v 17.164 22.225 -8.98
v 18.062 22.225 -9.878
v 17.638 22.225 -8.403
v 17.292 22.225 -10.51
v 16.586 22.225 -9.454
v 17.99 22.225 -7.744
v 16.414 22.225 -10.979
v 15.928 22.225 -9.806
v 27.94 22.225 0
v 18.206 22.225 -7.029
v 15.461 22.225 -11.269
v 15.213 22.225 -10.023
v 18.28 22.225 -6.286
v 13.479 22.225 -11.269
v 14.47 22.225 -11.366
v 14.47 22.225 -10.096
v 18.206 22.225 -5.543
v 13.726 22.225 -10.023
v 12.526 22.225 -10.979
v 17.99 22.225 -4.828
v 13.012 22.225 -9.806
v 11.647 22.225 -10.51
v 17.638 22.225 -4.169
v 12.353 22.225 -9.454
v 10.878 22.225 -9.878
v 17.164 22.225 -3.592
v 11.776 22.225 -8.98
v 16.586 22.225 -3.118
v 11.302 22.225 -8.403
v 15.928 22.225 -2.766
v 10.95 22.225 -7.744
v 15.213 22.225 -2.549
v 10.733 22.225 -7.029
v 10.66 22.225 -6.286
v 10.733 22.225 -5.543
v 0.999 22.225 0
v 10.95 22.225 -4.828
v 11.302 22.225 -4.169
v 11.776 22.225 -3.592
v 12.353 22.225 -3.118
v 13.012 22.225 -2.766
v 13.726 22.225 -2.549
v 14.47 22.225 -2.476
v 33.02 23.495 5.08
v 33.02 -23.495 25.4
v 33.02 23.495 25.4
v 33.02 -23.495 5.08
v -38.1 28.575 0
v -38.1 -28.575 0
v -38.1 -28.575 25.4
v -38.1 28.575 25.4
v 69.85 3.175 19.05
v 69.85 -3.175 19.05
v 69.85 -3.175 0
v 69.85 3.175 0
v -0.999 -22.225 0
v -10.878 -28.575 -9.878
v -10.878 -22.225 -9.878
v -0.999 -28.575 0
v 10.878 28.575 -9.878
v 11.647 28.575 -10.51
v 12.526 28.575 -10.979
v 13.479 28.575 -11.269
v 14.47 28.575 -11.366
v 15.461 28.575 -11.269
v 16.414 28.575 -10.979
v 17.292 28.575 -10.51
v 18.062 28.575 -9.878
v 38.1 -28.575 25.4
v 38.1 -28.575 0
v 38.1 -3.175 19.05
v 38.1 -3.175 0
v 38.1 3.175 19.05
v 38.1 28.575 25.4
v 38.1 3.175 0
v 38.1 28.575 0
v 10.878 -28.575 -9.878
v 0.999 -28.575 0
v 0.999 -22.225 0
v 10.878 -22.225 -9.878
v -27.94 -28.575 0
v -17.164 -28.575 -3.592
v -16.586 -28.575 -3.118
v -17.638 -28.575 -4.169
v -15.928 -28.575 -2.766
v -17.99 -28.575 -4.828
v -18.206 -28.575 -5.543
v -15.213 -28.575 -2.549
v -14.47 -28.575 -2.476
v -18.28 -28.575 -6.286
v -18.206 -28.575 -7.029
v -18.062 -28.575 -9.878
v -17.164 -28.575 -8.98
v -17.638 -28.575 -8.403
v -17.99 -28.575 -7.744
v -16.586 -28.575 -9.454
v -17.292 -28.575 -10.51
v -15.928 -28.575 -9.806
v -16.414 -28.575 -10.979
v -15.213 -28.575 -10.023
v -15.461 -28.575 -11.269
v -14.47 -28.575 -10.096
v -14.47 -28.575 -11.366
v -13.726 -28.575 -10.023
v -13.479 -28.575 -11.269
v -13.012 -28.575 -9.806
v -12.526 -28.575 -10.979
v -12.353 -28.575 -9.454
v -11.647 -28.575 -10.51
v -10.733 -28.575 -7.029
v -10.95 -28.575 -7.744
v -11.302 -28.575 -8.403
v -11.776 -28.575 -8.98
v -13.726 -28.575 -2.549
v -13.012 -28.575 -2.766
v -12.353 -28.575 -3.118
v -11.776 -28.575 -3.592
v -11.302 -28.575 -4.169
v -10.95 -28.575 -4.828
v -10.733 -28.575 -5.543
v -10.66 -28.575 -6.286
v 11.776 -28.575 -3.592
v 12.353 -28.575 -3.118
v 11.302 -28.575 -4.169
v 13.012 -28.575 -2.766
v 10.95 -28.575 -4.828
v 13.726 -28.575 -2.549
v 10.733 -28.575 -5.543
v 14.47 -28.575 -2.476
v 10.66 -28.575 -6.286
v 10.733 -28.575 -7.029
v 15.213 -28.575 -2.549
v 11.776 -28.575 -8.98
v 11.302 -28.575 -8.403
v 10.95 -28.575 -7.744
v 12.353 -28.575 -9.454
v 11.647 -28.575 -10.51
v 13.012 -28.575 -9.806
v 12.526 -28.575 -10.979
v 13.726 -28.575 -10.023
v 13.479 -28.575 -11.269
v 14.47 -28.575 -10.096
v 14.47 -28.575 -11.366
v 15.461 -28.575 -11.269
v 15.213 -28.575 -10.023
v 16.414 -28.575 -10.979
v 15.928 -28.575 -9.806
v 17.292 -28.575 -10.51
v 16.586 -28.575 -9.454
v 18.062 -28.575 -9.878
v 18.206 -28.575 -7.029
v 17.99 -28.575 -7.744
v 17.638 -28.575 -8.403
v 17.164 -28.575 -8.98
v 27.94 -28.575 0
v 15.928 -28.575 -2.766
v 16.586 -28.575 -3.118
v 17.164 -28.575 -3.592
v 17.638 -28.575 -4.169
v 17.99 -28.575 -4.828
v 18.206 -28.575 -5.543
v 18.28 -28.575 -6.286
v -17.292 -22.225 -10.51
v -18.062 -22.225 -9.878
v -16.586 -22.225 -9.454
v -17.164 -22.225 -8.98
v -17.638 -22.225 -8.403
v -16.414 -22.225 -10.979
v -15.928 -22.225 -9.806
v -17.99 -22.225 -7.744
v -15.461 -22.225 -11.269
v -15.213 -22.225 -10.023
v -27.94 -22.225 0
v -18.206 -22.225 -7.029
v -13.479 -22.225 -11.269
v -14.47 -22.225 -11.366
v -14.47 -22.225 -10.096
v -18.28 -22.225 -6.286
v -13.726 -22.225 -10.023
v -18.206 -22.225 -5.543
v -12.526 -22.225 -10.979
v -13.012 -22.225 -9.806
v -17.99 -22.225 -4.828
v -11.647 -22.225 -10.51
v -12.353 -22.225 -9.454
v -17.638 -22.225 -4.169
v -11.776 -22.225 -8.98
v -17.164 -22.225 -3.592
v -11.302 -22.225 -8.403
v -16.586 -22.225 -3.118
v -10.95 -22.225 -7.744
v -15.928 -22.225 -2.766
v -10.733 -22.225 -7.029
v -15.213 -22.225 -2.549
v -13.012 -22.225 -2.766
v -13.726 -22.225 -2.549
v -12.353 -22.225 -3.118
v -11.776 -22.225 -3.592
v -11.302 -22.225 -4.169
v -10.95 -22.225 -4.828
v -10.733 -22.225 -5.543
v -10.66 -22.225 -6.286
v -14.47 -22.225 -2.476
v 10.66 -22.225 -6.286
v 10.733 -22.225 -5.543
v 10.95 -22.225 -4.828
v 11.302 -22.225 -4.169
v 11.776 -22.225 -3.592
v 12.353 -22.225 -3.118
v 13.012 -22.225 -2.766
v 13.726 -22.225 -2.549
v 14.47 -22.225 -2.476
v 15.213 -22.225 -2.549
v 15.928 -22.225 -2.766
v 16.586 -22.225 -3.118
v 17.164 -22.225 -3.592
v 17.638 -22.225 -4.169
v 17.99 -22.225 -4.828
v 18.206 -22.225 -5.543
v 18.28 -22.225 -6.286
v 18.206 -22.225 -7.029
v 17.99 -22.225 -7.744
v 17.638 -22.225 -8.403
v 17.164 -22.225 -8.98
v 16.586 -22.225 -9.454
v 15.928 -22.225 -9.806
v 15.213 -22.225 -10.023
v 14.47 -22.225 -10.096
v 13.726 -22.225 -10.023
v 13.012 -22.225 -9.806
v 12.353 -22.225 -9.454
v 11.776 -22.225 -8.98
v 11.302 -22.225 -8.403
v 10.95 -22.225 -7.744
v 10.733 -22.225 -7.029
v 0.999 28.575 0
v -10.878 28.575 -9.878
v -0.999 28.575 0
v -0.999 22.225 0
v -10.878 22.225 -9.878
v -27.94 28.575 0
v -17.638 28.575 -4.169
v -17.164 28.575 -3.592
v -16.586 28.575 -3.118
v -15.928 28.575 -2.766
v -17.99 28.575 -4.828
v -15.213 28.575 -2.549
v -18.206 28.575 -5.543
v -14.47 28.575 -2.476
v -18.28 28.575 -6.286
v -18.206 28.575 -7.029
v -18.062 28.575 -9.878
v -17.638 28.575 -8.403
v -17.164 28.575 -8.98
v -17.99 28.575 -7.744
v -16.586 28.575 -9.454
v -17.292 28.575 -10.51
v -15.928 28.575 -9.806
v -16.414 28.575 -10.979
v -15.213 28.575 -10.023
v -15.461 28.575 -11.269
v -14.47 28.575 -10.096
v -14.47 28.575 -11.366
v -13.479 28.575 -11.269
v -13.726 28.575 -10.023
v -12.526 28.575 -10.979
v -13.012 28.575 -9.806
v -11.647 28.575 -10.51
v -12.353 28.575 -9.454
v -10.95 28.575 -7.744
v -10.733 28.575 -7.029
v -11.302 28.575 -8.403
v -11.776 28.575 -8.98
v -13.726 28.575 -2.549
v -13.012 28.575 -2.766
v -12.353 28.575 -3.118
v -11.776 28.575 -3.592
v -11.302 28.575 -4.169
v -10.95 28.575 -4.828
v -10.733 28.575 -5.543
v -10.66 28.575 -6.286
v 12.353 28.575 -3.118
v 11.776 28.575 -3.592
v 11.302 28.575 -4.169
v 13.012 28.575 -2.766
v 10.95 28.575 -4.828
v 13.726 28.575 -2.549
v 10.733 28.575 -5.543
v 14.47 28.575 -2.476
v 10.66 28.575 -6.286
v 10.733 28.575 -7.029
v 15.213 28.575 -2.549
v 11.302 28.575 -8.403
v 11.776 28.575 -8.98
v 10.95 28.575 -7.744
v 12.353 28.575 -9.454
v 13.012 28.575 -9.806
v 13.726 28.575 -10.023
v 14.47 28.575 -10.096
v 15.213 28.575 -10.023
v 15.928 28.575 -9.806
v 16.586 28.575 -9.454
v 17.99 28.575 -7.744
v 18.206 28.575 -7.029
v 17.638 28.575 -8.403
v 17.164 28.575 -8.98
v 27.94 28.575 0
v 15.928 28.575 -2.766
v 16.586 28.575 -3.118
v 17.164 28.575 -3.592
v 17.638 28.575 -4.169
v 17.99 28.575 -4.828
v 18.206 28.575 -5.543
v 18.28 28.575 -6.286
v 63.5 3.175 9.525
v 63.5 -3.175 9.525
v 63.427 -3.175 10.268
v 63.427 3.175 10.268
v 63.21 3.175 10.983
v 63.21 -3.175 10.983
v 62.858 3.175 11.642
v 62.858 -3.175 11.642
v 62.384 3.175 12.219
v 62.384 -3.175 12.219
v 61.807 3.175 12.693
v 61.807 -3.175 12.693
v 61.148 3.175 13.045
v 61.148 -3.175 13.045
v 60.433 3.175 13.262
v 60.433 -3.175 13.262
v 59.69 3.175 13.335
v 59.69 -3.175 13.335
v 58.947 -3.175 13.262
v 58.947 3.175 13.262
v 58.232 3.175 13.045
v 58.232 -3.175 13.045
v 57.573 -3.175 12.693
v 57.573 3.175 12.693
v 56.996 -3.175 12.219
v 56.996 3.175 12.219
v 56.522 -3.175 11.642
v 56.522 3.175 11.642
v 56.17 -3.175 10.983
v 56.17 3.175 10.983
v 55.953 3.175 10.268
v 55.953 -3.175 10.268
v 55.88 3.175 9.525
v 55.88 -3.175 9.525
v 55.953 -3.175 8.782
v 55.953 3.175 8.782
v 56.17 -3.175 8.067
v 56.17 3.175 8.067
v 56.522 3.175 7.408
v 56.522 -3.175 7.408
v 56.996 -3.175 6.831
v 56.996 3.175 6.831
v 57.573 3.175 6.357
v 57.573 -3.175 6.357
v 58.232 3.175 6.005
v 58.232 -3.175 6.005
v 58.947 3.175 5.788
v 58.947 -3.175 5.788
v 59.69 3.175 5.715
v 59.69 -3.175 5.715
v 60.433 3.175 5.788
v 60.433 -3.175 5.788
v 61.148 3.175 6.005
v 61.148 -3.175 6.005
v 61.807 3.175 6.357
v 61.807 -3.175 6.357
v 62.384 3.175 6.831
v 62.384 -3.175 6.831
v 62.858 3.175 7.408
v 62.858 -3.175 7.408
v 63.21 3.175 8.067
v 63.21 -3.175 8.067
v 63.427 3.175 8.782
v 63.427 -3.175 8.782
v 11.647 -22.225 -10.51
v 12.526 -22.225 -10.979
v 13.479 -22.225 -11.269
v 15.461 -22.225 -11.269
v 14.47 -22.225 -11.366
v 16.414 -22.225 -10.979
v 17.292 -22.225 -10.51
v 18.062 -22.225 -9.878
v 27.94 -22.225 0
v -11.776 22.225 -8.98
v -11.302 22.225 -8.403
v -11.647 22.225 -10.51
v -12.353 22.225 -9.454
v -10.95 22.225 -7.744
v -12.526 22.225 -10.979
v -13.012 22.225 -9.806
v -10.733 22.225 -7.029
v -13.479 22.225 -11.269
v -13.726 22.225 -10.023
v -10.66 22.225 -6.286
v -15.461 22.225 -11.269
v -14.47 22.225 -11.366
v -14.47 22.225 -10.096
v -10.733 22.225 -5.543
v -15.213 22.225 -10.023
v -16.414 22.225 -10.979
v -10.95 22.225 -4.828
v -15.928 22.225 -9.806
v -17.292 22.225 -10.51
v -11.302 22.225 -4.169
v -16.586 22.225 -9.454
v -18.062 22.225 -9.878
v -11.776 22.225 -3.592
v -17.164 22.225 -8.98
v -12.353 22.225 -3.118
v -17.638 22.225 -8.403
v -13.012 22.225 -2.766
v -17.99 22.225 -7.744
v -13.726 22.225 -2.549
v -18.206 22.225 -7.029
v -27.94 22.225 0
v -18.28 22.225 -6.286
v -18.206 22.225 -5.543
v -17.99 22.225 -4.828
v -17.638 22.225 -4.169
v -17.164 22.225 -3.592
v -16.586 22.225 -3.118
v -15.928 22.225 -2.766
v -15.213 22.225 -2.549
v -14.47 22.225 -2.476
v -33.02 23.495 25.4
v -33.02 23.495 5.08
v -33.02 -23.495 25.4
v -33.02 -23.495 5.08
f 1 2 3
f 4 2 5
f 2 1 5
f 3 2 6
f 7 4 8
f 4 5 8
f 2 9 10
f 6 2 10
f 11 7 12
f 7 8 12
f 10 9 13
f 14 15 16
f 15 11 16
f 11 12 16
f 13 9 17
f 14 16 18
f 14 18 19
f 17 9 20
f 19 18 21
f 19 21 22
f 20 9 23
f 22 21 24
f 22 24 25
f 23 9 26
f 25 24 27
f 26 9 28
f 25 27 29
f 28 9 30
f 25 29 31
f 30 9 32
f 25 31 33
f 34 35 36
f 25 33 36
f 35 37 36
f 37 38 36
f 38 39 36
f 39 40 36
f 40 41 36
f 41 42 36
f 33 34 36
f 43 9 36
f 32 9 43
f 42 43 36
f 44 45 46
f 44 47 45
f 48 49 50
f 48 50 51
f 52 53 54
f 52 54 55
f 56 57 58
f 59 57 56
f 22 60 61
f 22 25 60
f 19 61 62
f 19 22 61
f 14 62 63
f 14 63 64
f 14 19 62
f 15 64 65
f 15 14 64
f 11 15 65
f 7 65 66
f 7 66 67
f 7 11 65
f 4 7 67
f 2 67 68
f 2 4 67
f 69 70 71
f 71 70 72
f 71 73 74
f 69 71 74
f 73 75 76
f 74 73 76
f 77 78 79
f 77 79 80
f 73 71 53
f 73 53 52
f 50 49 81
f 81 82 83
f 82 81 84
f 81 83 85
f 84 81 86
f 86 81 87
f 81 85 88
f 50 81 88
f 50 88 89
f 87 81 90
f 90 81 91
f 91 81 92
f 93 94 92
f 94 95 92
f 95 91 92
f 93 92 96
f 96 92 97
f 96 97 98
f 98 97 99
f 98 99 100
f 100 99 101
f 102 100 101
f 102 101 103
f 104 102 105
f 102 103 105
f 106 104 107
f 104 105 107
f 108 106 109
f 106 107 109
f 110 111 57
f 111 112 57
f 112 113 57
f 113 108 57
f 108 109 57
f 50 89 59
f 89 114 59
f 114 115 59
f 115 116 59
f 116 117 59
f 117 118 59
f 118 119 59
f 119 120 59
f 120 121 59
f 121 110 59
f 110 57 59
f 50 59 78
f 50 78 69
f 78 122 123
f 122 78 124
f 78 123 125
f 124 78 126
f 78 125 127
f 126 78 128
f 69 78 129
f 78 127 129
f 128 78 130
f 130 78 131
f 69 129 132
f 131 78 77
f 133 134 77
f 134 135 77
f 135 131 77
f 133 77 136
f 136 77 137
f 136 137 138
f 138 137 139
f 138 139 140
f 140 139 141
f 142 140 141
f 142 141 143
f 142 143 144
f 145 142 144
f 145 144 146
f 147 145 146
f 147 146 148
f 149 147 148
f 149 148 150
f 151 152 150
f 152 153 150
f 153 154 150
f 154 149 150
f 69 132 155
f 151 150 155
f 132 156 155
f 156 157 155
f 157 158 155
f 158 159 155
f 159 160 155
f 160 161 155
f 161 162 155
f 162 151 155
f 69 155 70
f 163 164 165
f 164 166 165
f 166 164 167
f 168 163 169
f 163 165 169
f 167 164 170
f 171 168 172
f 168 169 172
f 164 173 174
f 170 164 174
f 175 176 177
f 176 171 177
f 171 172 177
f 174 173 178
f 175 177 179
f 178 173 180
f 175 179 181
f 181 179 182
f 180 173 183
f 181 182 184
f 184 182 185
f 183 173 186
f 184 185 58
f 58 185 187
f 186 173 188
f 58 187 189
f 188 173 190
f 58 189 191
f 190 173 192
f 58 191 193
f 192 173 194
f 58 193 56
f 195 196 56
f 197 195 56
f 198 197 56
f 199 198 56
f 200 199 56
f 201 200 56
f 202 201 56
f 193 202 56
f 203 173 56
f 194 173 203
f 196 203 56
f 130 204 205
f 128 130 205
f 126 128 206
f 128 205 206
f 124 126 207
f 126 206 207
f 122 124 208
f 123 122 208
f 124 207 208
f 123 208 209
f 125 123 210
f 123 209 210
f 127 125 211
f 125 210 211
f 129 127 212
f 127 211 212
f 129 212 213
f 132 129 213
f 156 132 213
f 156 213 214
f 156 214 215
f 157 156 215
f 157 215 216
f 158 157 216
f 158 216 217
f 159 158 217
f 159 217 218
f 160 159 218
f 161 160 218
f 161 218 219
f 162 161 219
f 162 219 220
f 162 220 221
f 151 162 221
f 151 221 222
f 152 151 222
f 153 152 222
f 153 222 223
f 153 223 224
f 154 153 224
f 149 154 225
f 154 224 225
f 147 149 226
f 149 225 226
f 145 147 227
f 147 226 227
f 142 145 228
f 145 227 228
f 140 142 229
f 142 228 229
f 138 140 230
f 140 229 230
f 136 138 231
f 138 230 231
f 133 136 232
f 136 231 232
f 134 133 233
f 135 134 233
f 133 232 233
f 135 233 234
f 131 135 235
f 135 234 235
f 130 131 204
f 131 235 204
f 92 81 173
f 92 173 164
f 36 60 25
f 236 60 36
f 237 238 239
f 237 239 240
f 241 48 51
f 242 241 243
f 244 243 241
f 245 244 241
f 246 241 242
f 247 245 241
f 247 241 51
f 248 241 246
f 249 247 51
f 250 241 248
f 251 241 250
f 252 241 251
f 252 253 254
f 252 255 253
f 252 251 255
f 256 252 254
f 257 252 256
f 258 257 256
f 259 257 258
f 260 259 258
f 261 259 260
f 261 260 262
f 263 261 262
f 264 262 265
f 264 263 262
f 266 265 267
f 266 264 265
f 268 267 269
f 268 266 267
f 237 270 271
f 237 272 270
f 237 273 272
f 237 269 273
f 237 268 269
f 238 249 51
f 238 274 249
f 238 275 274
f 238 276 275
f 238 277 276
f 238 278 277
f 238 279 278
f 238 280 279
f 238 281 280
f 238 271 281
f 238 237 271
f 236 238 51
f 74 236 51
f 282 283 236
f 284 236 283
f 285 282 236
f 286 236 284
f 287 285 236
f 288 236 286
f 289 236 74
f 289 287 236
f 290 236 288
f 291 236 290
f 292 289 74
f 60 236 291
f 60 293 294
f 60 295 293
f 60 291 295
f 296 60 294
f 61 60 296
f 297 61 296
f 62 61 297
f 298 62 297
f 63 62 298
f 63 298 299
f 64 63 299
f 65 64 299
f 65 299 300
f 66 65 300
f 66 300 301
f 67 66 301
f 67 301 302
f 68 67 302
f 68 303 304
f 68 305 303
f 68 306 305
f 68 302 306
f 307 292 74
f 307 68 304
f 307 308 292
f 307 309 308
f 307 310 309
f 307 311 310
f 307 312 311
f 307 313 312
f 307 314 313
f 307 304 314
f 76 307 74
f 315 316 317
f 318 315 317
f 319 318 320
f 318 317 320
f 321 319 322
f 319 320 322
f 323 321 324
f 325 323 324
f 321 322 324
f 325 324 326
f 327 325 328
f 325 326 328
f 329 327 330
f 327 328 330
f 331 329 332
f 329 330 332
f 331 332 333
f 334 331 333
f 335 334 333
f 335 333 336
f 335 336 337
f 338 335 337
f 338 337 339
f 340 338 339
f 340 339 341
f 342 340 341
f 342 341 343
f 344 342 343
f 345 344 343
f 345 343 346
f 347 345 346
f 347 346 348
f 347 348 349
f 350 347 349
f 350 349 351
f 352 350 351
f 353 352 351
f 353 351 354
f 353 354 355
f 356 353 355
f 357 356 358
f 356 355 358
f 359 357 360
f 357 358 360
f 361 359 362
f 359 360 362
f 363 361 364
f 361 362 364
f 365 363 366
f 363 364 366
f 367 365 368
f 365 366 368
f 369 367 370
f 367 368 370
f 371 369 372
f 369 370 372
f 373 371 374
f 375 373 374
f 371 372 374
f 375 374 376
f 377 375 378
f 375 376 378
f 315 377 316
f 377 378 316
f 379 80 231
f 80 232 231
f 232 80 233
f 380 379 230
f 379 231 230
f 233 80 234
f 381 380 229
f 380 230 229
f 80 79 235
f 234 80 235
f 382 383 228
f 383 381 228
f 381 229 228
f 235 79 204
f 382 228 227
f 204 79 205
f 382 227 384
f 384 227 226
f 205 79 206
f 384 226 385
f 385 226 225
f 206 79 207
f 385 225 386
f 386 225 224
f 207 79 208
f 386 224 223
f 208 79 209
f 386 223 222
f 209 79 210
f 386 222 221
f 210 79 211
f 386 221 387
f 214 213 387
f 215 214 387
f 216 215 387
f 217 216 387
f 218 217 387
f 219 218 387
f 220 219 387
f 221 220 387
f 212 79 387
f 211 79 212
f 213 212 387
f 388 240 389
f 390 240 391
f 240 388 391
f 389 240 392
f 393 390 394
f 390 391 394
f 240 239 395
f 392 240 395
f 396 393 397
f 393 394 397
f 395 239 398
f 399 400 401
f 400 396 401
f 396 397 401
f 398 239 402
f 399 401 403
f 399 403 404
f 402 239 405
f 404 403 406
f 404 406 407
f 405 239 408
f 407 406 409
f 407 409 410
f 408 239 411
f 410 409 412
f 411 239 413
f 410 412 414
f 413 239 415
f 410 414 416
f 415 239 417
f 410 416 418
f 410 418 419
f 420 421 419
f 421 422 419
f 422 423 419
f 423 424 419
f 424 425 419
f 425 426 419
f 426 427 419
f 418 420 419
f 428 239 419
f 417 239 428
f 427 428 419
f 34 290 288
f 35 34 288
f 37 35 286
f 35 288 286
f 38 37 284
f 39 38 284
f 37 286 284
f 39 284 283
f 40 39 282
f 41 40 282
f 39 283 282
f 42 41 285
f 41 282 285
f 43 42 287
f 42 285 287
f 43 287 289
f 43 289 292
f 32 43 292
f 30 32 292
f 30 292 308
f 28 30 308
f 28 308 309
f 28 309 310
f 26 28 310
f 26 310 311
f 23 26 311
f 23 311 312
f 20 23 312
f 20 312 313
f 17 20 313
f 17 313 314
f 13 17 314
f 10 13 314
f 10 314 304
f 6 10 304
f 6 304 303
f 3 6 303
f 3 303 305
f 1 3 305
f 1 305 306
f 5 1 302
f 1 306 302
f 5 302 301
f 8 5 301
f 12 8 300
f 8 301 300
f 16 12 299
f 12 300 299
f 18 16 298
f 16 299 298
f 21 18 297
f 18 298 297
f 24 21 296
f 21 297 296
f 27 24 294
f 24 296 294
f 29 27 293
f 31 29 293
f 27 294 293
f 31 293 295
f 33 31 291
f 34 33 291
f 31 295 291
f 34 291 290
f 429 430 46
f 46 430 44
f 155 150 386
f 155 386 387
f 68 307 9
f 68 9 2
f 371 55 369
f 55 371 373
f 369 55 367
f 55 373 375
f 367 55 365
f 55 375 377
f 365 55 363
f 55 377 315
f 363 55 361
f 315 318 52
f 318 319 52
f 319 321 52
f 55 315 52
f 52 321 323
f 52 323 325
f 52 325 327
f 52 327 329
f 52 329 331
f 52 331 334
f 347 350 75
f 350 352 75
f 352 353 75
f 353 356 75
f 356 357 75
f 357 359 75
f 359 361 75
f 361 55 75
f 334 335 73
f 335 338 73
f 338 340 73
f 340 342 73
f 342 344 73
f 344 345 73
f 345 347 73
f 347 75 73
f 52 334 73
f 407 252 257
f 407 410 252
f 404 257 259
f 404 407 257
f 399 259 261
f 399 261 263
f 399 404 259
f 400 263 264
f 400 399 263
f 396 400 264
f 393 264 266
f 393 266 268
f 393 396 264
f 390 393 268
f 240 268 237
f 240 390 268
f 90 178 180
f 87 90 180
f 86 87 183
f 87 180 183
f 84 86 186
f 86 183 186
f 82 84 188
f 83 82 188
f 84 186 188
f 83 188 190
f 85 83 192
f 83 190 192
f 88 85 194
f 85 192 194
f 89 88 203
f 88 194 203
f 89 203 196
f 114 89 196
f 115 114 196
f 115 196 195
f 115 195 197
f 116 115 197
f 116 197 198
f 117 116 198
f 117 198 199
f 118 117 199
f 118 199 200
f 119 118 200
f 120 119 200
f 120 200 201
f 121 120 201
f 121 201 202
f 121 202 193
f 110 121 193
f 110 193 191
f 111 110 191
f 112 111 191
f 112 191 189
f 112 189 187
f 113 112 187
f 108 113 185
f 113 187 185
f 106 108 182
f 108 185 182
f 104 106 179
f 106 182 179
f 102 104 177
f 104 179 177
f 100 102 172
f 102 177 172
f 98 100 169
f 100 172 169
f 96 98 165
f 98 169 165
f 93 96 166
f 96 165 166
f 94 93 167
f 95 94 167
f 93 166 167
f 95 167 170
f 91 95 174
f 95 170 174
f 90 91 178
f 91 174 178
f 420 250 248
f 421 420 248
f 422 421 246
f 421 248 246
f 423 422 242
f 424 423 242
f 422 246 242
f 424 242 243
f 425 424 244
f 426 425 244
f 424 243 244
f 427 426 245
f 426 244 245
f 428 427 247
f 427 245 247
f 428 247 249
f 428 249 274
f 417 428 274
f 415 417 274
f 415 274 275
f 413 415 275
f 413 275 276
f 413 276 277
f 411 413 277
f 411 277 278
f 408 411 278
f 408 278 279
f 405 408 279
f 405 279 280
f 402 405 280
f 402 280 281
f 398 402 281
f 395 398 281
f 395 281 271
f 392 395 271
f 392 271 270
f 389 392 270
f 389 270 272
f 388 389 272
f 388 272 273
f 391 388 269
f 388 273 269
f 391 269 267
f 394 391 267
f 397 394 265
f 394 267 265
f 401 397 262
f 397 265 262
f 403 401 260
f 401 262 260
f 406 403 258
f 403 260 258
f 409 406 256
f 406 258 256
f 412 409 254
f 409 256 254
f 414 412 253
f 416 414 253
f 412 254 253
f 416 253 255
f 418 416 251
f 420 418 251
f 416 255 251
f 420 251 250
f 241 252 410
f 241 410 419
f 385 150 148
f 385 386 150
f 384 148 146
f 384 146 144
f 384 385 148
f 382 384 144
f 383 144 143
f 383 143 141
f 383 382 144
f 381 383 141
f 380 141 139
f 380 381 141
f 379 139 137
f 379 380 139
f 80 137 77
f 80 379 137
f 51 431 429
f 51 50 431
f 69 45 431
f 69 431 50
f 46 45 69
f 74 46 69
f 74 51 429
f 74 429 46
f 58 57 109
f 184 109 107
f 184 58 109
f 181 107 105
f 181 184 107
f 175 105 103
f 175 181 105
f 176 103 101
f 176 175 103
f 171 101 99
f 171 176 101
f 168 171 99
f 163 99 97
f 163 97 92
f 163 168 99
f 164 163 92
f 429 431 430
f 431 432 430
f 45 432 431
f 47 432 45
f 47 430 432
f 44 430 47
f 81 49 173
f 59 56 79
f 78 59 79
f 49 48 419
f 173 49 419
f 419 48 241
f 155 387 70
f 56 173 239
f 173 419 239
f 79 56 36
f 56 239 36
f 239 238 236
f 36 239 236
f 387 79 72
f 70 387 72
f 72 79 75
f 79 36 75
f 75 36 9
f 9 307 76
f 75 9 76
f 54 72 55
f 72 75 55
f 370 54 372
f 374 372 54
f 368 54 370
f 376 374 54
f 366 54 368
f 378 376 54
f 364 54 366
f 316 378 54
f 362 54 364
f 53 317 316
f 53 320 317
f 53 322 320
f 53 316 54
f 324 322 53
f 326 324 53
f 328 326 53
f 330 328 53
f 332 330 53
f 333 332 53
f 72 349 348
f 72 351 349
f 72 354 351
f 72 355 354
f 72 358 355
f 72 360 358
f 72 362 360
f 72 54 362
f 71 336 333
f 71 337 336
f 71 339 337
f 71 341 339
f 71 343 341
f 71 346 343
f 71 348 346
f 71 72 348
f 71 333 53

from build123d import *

# Parameters (mm, degrees)
F0_W      = 76.2
F0_H      = 57.15
F1_DEPTH  = 25.4
F2_T      = -5.08
F4_DEPTH  = 6.35
F5_R      = 5.08
F8_DEPTH  = 6.35
F9_D      = 7.62
F10_R     = 5.08
F11_W     = 6.35
F11_H     = 19.05
F12_DEPTH = 31.75
F14_D     = 7.62


with BuildPart() as f1:
    # F0 (on Top) → F1 (new body)
    with BuildSketch(Plane.XY):
        Rectangle(F0_W, F0_H)
    extrude(amount=F1_DEPTH)

    # F2
    f2_openings = [f1.faces().sort_by_distance(p)[0] for p in [
        (0, 0, 25.4),
    ]]
    offset(amount=F2_T, openings=f2_openings)

    # F3 (on face) → F4 (join)
    with BuildSketch(Plane.XZ.offset(28.575)):
        Polygon((-0.9992316368, 0), (-27.94, 0), (-14.4696158184, -13.4703841816), align=None)
        Polygon((27.94, 0), (0.9992316368, 0), (14.4696158184, -13.4703841816), align=None)
    extrude(amount=-F4_DEPTH)

    # F5
    f5_edges = [f1.edges().sort_by_distance(p)[0] for p in [
        (-14.469616, -25.4, -13.470384),
        (14.469616, -25.4, -13.470384),
    ]]
    fillet(f5_edges, radius=F5_R)

    # F7 (on face) → F8 (join)
    with BuildSketch(Plane(origin=(0, 28.575, 0), x_dir=(-1, 0, 0), z_dir=(0, 1, 0))):
        Polygon((-0.9992316368, 0), (-27.94, 0), (-14.4696158184, -13.4703841816), align=None)
        Polygon((27.94, 0), (0.9992316368, 0), (14.4696158184, -13.4703841816), align=None)
    extrude(amount=-F8_DEPTH)

    # F9 (through all)
    with Locations(Plane.XZ.offset(28.575)):
        with Locations((-14.4696158184, -6.2861792847), (14.4696158184, -6.2861792847)):
            Hole(F9_D / 2)

    # F10
    f10_edges = [f1.edges().sort_by_distance(p)[0] for p in [
        (14.469616, 25.4, -13.470384),
        (-14.469616, 25.4, -13.470384),
    ]]
    fillet(f10_edges, radius=F10_R)

    # F11 (on face) → F12 (join)
    with BuildSketch(Plane.YZ.offset(38.1)):
        with Locations((0, 9.525)):
            Rectangle(F11_W, F11_H)
    extrude(amount=F12_DEPTH)

    # F14 (through all)
    with Locations(Plane(origin=(0, 3.175, 0), x_dir=(-1, 0, 0), z_dir=(0, 1, 0))):
        with Locations((-59.69, 9.525)):
            Hole(F14_D / 2)


solid = f1.part
